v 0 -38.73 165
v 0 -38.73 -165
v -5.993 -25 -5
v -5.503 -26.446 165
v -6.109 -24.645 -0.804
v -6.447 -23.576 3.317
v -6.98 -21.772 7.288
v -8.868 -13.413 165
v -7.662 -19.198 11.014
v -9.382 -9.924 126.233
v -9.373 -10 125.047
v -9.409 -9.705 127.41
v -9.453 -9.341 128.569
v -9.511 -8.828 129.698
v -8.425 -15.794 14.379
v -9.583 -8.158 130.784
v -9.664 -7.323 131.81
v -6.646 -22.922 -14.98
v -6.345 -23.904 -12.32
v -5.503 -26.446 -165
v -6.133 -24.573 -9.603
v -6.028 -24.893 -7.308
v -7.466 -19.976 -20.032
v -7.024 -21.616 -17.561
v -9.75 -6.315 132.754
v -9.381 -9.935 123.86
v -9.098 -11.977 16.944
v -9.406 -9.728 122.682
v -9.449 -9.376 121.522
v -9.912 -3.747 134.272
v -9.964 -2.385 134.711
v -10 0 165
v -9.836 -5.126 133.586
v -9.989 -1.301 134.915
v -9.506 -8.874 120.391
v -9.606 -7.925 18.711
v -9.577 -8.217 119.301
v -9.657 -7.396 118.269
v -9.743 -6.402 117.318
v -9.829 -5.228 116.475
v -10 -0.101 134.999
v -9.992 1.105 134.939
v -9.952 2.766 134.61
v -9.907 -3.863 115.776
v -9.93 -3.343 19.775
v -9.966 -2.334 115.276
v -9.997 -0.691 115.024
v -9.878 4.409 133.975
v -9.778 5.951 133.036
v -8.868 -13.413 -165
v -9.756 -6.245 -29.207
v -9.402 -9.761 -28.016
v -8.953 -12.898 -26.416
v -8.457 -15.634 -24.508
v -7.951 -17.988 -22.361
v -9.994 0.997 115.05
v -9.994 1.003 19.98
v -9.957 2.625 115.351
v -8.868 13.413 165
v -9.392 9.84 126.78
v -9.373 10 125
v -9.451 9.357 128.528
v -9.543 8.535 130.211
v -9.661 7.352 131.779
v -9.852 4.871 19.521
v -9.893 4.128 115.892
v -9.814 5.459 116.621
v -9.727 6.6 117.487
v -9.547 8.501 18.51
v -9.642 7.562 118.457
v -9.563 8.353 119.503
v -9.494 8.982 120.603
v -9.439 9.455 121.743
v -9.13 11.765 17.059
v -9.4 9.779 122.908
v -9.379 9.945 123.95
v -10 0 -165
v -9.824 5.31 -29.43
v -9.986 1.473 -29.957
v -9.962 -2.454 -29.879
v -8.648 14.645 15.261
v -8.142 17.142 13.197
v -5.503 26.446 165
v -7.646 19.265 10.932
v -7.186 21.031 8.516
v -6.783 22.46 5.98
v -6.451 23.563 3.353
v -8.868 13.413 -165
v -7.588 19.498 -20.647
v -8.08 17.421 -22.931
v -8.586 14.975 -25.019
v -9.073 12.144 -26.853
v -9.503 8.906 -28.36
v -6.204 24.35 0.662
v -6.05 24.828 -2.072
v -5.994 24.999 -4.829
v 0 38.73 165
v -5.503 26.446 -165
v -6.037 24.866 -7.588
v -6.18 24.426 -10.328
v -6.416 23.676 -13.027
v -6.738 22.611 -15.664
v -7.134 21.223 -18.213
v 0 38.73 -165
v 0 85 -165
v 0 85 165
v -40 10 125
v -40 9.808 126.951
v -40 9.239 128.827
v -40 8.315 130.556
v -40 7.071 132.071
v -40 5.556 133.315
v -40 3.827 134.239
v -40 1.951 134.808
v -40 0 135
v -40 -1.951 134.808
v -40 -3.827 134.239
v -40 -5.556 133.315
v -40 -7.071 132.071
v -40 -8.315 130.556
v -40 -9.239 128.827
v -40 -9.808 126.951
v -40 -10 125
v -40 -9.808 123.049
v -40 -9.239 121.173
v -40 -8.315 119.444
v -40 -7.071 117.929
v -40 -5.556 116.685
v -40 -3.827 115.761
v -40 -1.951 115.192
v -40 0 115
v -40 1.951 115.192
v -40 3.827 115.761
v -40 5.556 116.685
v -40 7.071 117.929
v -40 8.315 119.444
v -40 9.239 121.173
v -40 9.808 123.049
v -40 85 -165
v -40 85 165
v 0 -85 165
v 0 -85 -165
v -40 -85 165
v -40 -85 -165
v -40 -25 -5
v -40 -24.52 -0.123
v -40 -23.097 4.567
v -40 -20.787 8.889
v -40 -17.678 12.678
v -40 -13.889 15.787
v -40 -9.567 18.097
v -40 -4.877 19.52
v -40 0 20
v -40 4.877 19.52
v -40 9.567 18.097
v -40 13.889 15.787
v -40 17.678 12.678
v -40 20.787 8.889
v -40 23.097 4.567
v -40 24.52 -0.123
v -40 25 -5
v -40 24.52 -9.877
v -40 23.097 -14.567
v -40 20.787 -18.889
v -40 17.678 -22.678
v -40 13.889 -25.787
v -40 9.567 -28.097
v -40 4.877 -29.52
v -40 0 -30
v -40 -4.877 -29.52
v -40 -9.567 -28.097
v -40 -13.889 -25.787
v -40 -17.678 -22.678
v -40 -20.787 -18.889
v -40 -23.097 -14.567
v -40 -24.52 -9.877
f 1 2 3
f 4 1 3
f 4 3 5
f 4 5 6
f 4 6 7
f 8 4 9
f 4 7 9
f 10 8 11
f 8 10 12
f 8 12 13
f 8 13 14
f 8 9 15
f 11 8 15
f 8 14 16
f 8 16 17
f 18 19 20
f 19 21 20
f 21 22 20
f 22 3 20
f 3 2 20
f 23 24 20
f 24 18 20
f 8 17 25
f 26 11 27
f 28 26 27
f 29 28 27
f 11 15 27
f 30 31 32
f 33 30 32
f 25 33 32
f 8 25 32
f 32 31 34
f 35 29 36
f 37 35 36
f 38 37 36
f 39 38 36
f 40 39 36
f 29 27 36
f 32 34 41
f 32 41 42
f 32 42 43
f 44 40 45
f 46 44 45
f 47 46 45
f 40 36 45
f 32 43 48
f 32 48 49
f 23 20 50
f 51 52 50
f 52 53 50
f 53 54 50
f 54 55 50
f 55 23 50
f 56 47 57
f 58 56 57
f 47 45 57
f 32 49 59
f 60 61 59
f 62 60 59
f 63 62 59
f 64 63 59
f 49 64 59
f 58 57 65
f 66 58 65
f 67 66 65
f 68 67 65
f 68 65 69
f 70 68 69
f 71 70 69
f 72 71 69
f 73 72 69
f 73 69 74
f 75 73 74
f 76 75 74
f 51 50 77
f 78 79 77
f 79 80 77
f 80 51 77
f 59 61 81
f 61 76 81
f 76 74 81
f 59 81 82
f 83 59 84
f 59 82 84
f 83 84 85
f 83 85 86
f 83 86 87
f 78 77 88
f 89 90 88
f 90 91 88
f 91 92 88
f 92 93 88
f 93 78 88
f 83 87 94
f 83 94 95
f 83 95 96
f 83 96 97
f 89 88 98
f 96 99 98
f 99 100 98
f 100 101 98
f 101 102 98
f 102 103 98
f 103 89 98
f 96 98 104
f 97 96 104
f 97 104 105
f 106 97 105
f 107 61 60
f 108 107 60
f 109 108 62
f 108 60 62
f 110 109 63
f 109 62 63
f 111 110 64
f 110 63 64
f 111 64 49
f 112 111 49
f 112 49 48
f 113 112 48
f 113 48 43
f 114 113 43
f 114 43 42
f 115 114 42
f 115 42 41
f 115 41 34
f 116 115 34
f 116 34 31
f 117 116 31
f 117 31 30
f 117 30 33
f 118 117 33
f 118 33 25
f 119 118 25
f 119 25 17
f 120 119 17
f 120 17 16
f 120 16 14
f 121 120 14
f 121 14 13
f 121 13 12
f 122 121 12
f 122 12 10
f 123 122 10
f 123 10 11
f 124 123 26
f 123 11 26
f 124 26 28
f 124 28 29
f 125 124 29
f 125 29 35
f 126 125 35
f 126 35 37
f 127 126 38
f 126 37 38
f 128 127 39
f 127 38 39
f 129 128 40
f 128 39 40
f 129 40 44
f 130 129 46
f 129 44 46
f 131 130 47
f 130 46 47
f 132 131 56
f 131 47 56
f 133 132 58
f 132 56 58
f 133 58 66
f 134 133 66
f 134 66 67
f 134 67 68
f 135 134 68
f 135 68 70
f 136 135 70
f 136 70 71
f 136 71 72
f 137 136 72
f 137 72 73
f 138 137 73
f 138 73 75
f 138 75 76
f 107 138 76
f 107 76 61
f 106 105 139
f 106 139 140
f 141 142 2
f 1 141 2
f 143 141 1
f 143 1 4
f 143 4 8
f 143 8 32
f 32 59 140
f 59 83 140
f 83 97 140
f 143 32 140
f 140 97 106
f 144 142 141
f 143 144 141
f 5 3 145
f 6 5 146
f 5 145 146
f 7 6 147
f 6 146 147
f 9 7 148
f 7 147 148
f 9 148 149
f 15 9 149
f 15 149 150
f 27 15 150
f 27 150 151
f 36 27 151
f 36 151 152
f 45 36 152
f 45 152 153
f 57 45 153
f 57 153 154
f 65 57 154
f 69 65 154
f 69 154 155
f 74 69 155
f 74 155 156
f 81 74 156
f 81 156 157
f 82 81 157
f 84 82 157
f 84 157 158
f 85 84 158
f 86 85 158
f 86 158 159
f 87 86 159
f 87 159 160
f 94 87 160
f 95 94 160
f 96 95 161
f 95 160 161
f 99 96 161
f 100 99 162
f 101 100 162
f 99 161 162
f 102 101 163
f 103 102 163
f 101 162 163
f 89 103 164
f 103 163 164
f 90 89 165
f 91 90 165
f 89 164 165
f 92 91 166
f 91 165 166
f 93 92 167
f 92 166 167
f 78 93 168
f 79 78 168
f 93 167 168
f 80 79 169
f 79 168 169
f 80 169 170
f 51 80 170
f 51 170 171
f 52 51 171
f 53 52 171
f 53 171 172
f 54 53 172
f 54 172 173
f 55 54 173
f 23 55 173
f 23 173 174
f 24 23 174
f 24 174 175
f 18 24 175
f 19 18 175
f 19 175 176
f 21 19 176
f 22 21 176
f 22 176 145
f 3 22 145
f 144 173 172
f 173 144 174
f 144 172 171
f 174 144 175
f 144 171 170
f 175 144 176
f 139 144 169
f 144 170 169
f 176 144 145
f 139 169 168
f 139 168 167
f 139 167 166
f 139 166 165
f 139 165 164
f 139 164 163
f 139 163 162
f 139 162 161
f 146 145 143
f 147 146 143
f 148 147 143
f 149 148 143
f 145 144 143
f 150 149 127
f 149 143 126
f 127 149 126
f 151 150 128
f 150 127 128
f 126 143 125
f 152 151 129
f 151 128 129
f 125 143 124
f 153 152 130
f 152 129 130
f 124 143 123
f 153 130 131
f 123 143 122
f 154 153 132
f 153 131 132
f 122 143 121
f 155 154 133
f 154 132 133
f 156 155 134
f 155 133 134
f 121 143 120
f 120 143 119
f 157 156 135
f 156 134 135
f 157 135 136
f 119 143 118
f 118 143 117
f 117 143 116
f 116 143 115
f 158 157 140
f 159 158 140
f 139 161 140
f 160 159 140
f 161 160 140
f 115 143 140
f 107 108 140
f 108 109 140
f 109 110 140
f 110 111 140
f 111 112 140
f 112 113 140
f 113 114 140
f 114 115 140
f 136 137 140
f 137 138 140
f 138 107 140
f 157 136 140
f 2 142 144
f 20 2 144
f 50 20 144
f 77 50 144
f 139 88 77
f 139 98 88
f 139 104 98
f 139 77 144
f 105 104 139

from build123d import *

# Parameters (mm, degrees)
F0_W     = 170
F0_H     = 330
F0_R     = 25
F0_R_2   = 10
F1_DEPTH = 40
F2_D     = 50
F4_DEPTH = 330.001


with BuildPart() as f1:
    # F0 (on Right) → F1 (new body)
    with BuildSketch(Plane.YZ):
        Rectangle(F0_W, F0_H)
        with Locations((0, -5)):
            Circle(F0_R, mode=Mode.SUBTRACT)
        with Locations((0, 125)):
            Circle(F0_R_2, mode=Mode.SUBTRACT)
        with Locations((0, -5)):
            Circle(F0_R)
    extrude(amount=-F1_DEPTH)

    # F2 (through all)
    with Locations(Plane.YZ):
        with Locations((0, -5)):
            Hole(F2_D / 2)

    # F3 (on face) → F4 (cut, through all)
    with BuildSketch(Plane(origin=(0, 0, -165), x_dir=(1, 0, 0), z_dir=(0, 0, -1))):
        with BuildLine():
            Line((0, -38.729833), (0, 38.729833))
            ThreePointArc((0, 38.729833), (-10, 0), (0, -38.729833))
        make_face()
    extrude(amount=-F4_DEPTH, mode=Mode.SUBTRACT)


solid = f1.part
